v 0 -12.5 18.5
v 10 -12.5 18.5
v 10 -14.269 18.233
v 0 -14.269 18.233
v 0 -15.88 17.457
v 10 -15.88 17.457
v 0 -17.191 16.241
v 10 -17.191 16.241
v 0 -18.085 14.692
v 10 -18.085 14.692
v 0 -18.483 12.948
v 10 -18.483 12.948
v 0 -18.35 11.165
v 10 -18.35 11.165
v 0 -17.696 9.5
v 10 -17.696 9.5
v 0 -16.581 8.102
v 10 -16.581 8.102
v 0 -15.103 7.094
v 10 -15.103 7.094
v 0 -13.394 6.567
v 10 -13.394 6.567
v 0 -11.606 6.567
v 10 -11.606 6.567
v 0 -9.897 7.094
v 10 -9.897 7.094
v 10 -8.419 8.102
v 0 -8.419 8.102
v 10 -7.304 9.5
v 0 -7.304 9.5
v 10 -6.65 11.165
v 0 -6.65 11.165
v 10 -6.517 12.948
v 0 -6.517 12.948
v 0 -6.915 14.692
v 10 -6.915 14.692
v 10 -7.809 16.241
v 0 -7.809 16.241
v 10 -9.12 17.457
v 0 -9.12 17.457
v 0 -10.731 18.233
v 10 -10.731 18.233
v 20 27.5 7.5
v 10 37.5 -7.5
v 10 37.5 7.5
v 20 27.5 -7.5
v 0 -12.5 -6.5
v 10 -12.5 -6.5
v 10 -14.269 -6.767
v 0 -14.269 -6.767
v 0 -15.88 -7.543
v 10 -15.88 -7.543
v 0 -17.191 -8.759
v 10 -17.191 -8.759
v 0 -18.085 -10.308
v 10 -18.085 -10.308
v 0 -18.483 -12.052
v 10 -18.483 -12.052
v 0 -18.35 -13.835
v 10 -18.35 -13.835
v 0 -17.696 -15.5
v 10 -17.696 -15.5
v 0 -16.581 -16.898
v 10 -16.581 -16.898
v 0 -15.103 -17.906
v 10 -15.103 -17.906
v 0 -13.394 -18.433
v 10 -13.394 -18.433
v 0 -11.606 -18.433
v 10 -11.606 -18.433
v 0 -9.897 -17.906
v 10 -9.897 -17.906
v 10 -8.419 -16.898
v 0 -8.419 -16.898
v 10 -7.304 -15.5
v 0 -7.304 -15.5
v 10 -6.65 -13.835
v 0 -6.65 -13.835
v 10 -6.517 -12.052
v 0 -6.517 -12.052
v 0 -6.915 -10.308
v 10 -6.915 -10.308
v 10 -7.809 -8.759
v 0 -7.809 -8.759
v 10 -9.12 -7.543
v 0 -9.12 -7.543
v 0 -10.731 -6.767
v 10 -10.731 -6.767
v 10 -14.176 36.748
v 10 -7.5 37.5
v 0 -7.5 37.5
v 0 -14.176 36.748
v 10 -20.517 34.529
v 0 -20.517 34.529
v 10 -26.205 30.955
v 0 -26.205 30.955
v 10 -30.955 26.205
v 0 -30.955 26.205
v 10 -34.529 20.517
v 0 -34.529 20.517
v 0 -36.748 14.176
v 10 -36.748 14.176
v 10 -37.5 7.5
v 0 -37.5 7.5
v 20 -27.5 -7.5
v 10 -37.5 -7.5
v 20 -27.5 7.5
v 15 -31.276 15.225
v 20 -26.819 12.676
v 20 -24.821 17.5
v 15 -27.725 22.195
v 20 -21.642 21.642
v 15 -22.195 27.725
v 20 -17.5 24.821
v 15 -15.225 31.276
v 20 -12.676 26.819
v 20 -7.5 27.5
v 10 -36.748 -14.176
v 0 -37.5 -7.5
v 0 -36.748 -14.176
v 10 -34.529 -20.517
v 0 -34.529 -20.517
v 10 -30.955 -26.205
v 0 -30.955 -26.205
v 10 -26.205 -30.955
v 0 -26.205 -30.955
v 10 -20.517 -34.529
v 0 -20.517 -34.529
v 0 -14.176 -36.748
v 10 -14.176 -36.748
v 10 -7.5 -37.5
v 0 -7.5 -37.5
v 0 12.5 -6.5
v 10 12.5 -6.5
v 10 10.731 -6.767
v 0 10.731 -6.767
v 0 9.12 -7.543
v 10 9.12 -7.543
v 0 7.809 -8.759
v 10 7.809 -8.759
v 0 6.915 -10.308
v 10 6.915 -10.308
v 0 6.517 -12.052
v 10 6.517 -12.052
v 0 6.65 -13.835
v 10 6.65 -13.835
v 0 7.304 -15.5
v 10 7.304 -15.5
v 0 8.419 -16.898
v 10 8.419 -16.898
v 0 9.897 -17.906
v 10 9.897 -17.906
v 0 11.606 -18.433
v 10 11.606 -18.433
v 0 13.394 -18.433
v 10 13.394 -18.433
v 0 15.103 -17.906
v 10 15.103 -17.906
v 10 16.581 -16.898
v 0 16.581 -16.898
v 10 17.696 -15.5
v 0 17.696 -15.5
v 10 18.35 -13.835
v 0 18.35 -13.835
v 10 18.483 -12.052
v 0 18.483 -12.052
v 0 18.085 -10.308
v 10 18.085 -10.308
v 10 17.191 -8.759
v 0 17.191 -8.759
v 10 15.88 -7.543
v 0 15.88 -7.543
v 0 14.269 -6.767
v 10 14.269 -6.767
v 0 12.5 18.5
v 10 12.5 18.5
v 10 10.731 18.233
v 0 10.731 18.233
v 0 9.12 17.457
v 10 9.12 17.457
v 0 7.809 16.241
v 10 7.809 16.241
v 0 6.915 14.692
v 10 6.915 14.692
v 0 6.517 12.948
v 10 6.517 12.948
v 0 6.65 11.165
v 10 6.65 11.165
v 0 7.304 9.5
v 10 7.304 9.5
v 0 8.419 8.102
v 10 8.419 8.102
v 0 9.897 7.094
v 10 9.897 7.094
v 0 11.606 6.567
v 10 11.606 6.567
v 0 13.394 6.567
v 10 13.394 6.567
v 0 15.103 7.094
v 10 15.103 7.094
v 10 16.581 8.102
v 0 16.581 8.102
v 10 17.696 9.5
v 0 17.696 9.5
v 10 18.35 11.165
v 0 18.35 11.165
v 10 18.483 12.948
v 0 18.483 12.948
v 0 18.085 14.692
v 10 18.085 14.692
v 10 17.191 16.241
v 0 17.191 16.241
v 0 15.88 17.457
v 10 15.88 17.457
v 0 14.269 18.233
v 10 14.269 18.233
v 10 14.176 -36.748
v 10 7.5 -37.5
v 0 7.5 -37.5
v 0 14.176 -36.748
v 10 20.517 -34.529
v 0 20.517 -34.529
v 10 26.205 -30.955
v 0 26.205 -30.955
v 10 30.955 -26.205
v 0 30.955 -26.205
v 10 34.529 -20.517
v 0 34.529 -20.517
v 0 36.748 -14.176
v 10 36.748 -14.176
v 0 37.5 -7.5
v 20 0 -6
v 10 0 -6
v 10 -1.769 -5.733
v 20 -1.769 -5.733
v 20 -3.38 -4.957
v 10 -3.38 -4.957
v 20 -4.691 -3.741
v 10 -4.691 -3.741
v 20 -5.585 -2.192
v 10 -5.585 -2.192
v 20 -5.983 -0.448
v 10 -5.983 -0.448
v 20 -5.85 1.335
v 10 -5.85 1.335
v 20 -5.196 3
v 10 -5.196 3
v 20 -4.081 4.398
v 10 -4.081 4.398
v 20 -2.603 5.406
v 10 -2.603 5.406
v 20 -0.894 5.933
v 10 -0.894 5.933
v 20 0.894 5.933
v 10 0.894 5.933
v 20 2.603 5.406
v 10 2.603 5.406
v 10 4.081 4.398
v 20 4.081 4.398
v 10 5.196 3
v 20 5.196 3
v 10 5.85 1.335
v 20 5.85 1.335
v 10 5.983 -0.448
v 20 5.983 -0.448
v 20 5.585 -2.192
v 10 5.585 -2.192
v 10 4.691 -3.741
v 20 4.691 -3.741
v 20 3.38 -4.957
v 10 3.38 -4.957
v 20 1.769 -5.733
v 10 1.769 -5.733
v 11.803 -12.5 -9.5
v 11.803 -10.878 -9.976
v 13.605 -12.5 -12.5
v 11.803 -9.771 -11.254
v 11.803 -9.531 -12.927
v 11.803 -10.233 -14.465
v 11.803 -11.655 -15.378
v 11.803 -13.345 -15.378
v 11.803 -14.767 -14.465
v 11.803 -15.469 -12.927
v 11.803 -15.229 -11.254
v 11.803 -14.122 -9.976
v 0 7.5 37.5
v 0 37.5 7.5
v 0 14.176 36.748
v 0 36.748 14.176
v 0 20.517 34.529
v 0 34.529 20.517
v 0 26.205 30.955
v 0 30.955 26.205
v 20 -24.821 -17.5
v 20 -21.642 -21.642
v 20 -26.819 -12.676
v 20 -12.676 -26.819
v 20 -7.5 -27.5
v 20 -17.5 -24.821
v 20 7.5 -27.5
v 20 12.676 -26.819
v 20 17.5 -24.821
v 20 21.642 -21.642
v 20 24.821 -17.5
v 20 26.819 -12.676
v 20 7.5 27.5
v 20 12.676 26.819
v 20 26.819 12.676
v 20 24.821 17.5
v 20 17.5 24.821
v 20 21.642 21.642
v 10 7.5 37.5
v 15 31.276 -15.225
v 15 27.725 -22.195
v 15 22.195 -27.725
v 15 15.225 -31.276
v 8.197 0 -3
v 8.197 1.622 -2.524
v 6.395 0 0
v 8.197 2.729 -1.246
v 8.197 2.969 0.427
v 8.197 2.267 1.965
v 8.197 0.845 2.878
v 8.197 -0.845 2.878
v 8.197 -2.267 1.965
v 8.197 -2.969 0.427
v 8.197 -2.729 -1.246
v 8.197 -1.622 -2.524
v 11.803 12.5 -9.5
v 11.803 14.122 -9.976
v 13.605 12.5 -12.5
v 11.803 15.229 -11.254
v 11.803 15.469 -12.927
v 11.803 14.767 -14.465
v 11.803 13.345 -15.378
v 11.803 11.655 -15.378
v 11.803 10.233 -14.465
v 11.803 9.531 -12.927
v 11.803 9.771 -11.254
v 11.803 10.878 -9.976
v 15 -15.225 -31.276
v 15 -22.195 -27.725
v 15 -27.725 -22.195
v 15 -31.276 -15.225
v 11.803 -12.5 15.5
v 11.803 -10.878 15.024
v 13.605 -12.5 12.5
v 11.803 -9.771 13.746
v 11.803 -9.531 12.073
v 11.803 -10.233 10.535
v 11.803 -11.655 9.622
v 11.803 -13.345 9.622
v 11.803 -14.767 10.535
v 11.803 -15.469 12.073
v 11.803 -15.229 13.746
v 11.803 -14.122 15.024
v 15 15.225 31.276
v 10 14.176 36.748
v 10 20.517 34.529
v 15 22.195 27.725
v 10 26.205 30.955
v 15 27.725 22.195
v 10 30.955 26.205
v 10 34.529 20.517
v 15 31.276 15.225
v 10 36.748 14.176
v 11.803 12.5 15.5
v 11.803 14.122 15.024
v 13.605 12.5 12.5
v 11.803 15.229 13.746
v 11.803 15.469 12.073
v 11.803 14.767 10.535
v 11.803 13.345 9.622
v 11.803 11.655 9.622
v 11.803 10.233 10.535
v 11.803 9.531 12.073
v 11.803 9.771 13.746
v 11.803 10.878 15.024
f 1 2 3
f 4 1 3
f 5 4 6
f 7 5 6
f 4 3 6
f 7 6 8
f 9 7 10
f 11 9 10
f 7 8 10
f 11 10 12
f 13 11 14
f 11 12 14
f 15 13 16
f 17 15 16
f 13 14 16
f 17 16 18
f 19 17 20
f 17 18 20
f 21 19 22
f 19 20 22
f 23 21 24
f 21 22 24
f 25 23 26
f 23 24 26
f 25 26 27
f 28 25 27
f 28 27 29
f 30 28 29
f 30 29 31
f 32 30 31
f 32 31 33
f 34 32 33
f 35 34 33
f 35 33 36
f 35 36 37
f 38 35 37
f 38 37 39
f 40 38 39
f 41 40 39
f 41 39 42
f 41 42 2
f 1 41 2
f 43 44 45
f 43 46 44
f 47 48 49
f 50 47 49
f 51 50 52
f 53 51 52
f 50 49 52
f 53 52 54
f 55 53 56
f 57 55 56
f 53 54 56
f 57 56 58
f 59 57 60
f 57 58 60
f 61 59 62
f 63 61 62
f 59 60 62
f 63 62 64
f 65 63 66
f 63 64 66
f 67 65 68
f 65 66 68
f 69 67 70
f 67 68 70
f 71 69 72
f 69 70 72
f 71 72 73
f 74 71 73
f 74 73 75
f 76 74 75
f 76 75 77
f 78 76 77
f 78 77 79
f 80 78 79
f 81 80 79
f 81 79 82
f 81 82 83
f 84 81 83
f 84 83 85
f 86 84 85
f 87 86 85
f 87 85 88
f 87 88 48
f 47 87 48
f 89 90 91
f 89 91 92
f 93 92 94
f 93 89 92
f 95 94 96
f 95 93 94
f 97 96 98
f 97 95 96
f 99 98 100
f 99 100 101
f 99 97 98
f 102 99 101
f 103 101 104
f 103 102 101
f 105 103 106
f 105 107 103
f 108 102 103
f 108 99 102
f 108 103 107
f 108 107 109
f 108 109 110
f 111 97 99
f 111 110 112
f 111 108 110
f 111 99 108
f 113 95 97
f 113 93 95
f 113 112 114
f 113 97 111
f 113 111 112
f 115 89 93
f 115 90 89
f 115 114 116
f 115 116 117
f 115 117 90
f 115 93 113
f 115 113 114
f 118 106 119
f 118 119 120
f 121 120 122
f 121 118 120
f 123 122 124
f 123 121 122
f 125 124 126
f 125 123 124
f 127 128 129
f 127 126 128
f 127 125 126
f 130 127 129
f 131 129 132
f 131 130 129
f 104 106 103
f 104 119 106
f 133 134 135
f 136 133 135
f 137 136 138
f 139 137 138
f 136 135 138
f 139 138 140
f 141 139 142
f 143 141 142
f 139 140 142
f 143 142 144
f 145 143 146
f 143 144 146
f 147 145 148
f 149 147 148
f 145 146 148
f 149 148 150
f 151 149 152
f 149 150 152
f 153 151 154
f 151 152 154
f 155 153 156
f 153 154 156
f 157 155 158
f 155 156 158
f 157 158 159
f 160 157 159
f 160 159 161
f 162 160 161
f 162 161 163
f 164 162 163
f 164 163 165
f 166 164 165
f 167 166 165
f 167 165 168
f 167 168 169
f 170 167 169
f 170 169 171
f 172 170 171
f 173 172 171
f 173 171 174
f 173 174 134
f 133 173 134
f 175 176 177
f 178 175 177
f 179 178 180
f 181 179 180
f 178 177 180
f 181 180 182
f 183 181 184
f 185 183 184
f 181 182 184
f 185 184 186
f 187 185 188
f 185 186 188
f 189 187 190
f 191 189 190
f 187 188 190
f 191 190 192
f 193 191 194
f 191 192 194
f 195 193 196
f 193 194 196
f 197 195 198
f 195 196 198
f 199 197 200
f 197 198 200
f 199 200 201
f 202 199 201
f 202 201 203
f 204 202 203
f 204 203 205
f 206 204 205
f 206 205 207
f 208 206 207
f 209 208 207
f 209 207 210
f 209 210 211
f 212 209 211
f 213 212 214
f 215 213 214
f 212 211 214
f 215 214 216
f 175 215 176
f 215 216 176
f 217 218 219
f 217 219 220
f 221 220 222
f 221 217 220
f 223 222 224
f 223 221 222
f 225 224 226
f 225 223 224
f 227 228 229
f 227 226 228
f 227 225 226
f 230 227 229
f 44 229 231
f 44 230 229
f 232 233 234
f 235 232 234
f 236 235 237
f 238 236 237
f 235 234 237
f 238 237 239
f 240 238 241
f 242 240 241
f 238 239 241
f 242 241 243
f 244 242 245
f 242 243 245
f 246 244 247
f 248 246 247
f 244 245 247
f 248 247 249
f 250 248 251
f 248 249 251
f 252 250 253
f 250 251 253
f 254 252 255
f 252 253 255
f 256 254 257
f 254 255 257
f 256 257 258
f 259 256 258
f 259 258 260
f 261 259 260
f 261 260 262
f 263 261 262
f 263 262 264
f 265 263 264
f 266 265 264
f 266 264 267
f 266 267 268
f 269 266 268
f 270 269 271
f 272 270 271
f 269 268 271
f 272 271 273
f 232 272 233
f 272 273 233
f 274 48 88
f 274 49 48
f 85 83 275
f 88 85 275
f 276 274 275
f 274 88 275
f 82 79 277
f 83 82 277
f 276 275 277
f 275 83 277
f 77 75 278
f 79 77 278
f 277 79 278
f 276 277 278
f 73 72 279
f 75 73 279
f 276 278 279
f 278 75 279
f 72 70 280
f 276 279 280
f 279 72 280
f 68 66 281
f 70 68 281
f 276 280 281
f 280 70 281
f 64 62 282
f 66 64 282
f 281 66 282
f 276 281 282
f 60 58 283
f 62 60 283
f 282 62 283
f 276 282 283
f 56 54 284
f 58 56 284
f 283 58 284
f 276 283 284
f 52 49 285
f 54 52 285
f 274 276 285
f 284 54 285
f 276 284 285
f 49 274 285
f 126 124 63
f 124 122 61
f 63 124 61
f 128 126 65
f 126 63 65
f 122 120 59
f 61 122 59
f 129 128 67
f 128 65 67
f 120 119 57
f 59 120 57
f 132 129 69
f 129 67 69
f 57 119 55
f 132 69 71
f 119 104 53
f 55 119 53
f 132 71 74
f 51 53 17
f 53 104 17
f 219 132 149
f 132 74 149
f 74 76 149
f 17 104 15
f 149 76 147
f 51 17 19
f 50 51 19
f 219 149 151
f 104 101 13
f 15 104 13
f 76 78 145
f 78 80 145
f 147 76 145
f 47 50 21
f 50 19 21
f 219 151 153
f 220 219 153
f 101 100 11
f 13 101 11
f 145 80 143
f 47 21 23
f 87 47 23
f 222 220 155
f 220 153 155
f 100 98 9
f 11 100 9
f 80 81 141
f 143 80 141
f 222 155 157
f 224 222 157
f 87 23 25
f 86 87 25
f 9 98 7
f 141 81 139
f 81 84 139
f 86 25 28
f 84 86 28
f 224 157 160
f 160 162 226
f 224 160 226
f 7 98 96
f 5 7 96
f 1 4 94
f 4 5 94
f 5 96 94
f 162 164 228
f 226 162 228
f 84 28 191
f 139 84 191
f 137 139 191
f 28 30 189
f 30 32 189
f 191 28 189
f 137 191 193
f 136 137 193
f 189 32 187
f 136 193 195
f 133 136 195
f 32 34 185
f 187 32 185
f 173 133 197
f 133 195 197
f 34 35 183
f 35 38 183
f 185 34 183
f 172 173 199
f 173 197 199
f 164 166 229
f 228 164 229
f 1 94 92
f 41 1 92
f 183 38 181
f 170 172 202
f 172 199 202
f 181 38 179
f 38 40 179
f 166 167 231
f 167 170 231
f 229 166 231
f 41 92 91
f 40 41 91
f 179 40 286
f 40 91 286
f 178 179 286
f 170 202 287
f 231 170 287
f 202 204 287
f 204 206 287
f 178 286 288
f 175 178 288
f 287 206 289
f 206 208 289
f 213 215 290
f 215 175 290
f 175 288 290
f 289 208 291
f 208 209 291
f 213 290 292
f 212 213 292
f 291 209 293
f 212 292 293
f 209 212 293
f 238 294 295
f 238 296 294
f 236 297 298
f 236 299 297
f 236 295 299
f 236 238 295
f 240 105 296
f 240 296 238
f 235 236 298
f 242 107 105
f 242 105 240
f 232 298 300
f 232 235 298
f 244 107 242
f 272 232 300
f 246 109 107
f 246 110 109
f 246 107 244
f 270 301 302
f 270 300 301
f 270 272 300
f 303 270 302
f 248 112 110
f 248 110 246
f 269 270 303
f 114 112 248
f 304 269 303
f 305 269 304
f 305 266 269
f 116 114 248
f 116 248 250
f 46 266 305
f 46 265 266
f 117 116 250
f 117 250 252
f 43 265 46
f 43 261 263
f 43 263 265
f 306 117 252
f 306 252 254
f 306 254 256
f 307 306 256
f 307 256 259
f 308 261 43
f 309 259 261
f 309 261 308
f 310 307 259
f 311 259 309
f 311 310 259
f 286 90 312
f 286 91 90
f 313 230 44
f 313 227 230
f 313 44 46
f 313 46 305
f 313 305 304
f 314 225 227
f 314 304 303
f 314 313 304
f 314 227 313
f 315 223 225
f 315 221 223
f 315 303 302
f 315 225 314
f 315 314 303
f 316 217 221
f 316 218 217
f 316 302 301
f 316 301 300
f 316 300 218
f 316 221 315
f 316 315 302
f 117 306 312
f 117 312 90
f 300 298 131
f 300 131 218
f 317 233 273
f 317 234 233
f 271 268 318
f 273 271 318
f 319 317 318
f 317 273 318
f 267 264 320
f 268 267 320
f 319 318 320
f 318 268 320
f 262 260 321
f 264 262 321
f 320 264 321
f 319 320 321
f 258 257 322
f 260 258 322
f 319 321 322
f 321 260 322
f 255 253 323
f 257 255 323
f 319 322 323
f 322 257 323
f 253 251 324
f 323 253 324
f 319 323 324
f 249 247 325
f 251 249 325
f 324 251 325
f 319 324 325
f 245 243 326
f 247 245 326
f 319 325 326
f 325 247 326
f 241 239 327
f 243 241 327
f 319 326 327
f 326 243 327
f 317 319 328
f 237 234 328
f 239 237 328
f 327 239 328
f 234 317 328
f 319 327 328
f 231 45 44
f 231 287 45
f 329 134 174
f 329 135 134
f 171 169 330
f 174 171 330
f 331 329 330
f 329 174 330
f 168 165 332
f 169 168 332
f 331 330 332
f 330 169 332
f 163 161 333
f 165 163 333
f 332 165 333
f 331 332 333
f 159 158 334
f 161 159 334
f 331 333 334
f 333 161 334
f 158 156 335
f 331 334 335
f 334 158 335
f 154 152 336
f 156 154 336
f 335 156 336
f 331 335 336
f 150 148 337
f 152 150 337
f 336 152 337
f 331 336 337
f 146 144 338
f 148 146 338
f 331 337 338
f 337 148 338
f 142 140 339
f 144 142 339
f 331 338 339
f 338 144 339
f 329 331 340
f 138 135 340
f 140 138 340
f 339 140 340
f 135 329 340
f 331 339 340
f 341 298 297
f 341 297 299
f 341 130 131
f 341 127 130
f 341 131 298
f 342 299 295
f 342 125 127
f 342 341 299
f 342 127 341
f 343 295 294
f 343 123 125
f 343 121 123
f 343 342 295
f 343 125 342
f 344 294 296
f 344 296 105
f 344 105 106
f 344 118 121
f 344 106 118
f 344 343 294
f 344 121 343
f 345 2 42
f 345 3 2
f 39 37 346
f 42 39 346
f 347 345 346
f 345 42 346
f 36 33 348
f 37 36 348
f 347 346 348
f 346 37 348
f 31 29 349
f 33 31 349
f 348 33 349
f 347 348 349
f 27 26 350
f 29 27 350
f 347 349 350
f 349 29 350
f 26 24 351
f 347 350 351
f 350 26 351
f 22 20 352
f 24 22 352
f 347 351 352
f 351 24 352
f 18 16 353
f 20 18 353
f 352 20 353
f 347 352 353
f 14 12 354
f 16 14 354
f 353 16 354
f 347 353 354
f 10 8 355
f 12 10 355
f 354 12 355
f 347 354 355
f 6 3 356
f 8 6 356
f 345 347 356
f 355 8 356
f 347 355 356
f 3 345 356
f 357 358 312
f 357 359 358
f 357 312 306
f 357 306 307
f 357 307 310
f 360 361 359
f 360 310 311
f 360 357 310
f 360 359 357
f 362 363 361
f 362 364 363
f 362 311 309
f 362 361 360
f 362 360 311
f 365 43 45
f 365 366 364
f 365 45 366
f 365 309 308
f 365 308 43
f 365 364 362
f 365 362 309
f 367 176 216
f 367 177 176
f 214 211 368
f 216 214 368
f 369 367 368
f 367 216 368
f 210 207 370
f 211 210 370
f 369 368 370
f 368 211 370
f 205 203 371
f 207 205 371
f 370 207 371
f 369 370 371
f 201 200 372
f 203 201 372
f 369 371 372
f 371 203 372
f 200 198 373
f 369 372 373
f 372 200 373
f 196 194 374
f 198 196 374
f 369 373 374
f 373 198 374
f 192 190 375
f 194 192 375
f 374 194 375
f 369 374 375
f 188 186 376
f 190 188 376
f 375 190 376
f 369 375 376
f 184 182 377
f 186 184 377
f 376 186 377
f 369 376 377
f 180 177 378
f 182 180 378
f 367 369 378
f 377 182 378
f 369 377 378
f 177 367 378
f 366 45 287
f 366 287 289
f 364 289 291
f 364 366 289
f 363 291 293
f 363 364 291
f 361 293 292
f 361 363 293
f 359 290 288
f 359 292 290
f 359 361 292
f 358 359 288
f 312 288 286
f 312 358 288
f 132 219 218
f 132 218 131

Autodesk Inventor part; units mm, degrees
ref_plane "YZ Plane" through (0, 0, 0) normal (1, 0, 0) x (0, 1, 0)
ref_plane "XZ Plane" through (0, 0, 0) normal (0, 1, 0) x (-1, 0, 0)
ref_plane "XY Plane" through (0, 0, 0) normal (0, 0, 1) x (1, 0, 0)
sketch "草圖1" plane through (0, 0, 0) normal (1, 0, 0) x (0, 1, 0)
  line L0 (-37.5, 37.5) -> (37.5, 37.5)
  line L1 (37.5, 37.5) -> (37.5, -37.5)
  line L2 (37.5, -37.5) -> (-37.5, -37.5)
  line L3 (-37.5, -37.5) -> (-37.5, 37.5)
  line L4 (-37.5, 37.5) -> (37.5, -37.5) construction
  line L5 (37.5, 37.5) -> (-37.5, -37.5) construction
  point P0 (0, 0)
  dimension "d0" = 75
  dimension "d1" = 75
extrude "擠出1" add sketch "草圖1" along normal blind 20
fillet "圓角1" radius 30 4 edges at (10, 37.5, 37.5) (10, -37.5, 37.5) (10, 37.5, -37.5) (10, -37.5, -37.5)
chamfer "倒角1" distance 10 angle 45 8 edges at (20, 0, 37.5) (20, -28.7132, 28.7132) (20, -37.5, 0) (20, -28.7132, -28.7132) (20, 0, -37.5) (20, 28.7132, -28.7132) (20, 37.5, 0) (20, 28.7132, 28.7132)
sketch "草圖2" plane through (20, 0, 0) normal (1, 0, 0) x (0, 0, -1)
  line L0 (0, 0) -> (0, 0)
  line L1 (0, 0) -> (0, 0)
  line L2 (0, 0) -> (0, 0)
  line L3 (0, 0) -> (0, 0)
  line L4 (0, 0) -> (0, 0) construction
  line L5 (0, 0) -> (0, 0) construction
  point P0 (0, 0)
  dimension "d8" = 0
  dimension "d9" = 0
hole "孔1" at (20, 0, 0) at (20, 0, 0) at (20, 0, 0) at (20, 0, 0) direction (-1, 0, 0) diameter 12 depth 10 tip angle 118
sketch "草圖3" plane through (0, 0, 0) normal (-1, 0, 0) x (0, 0, 1)
  arc A0 (-37.5, -7.5) -> (-7.5, -37.5) centre (-7.5, -7.5) ccw projected
  line L0 (-7.5, -37.5) -> (7.5, -37.5) projected
  arc A1 (7.5, -37.5) -> (37.5, -7.5) centre (7.5, -7.5) ccw projected
  line L1 (37.5, -7.5) -> (37.5, 7.5) projected
  arc A2 (37.5, 7.5) -> (7.5, 37.5) centre (7.5, 7.5) ccw projected
  line L2 (7.5, 37.5) -> (-7.5, 37.5) projected
  arc A3 (-7.5, 37.5) -> (-37.5, 7.5) centre (-7.5, 7.5) ccw projected
  line L3 (-37.5, 7.5) -> (-37.5, -7.5) projected
  line L4 (12.5, 12.5) -> (-12.5, 12.5)
  line L5 (-12.5, 12.5) -> (-12.5, -12.5)
  line L6 (-12.5, -12.5) -> (12.5, -12.5)
  line L7 (12.5, -12.5) -> (12.5, 12.5)
  line L8 (12.5, 12.5) -> (-12.5, -12.5) construction
  line L9 (-12.5, 12.5) -> (12.5, -12.5) construction
  point P0 (0, 0)
  dimension "d17" = 25
  dimension "d18" = 25
hole "孔2" at (0, -12.5, 12.5) at (0, -12.5, -12.5) at (0, 12.5, -12.5) at (0, 12.5, 12.5) direction (1, 0, 0) diameter 12 depth 10 tip angle 118
properties part number "exercise3-1-6"
